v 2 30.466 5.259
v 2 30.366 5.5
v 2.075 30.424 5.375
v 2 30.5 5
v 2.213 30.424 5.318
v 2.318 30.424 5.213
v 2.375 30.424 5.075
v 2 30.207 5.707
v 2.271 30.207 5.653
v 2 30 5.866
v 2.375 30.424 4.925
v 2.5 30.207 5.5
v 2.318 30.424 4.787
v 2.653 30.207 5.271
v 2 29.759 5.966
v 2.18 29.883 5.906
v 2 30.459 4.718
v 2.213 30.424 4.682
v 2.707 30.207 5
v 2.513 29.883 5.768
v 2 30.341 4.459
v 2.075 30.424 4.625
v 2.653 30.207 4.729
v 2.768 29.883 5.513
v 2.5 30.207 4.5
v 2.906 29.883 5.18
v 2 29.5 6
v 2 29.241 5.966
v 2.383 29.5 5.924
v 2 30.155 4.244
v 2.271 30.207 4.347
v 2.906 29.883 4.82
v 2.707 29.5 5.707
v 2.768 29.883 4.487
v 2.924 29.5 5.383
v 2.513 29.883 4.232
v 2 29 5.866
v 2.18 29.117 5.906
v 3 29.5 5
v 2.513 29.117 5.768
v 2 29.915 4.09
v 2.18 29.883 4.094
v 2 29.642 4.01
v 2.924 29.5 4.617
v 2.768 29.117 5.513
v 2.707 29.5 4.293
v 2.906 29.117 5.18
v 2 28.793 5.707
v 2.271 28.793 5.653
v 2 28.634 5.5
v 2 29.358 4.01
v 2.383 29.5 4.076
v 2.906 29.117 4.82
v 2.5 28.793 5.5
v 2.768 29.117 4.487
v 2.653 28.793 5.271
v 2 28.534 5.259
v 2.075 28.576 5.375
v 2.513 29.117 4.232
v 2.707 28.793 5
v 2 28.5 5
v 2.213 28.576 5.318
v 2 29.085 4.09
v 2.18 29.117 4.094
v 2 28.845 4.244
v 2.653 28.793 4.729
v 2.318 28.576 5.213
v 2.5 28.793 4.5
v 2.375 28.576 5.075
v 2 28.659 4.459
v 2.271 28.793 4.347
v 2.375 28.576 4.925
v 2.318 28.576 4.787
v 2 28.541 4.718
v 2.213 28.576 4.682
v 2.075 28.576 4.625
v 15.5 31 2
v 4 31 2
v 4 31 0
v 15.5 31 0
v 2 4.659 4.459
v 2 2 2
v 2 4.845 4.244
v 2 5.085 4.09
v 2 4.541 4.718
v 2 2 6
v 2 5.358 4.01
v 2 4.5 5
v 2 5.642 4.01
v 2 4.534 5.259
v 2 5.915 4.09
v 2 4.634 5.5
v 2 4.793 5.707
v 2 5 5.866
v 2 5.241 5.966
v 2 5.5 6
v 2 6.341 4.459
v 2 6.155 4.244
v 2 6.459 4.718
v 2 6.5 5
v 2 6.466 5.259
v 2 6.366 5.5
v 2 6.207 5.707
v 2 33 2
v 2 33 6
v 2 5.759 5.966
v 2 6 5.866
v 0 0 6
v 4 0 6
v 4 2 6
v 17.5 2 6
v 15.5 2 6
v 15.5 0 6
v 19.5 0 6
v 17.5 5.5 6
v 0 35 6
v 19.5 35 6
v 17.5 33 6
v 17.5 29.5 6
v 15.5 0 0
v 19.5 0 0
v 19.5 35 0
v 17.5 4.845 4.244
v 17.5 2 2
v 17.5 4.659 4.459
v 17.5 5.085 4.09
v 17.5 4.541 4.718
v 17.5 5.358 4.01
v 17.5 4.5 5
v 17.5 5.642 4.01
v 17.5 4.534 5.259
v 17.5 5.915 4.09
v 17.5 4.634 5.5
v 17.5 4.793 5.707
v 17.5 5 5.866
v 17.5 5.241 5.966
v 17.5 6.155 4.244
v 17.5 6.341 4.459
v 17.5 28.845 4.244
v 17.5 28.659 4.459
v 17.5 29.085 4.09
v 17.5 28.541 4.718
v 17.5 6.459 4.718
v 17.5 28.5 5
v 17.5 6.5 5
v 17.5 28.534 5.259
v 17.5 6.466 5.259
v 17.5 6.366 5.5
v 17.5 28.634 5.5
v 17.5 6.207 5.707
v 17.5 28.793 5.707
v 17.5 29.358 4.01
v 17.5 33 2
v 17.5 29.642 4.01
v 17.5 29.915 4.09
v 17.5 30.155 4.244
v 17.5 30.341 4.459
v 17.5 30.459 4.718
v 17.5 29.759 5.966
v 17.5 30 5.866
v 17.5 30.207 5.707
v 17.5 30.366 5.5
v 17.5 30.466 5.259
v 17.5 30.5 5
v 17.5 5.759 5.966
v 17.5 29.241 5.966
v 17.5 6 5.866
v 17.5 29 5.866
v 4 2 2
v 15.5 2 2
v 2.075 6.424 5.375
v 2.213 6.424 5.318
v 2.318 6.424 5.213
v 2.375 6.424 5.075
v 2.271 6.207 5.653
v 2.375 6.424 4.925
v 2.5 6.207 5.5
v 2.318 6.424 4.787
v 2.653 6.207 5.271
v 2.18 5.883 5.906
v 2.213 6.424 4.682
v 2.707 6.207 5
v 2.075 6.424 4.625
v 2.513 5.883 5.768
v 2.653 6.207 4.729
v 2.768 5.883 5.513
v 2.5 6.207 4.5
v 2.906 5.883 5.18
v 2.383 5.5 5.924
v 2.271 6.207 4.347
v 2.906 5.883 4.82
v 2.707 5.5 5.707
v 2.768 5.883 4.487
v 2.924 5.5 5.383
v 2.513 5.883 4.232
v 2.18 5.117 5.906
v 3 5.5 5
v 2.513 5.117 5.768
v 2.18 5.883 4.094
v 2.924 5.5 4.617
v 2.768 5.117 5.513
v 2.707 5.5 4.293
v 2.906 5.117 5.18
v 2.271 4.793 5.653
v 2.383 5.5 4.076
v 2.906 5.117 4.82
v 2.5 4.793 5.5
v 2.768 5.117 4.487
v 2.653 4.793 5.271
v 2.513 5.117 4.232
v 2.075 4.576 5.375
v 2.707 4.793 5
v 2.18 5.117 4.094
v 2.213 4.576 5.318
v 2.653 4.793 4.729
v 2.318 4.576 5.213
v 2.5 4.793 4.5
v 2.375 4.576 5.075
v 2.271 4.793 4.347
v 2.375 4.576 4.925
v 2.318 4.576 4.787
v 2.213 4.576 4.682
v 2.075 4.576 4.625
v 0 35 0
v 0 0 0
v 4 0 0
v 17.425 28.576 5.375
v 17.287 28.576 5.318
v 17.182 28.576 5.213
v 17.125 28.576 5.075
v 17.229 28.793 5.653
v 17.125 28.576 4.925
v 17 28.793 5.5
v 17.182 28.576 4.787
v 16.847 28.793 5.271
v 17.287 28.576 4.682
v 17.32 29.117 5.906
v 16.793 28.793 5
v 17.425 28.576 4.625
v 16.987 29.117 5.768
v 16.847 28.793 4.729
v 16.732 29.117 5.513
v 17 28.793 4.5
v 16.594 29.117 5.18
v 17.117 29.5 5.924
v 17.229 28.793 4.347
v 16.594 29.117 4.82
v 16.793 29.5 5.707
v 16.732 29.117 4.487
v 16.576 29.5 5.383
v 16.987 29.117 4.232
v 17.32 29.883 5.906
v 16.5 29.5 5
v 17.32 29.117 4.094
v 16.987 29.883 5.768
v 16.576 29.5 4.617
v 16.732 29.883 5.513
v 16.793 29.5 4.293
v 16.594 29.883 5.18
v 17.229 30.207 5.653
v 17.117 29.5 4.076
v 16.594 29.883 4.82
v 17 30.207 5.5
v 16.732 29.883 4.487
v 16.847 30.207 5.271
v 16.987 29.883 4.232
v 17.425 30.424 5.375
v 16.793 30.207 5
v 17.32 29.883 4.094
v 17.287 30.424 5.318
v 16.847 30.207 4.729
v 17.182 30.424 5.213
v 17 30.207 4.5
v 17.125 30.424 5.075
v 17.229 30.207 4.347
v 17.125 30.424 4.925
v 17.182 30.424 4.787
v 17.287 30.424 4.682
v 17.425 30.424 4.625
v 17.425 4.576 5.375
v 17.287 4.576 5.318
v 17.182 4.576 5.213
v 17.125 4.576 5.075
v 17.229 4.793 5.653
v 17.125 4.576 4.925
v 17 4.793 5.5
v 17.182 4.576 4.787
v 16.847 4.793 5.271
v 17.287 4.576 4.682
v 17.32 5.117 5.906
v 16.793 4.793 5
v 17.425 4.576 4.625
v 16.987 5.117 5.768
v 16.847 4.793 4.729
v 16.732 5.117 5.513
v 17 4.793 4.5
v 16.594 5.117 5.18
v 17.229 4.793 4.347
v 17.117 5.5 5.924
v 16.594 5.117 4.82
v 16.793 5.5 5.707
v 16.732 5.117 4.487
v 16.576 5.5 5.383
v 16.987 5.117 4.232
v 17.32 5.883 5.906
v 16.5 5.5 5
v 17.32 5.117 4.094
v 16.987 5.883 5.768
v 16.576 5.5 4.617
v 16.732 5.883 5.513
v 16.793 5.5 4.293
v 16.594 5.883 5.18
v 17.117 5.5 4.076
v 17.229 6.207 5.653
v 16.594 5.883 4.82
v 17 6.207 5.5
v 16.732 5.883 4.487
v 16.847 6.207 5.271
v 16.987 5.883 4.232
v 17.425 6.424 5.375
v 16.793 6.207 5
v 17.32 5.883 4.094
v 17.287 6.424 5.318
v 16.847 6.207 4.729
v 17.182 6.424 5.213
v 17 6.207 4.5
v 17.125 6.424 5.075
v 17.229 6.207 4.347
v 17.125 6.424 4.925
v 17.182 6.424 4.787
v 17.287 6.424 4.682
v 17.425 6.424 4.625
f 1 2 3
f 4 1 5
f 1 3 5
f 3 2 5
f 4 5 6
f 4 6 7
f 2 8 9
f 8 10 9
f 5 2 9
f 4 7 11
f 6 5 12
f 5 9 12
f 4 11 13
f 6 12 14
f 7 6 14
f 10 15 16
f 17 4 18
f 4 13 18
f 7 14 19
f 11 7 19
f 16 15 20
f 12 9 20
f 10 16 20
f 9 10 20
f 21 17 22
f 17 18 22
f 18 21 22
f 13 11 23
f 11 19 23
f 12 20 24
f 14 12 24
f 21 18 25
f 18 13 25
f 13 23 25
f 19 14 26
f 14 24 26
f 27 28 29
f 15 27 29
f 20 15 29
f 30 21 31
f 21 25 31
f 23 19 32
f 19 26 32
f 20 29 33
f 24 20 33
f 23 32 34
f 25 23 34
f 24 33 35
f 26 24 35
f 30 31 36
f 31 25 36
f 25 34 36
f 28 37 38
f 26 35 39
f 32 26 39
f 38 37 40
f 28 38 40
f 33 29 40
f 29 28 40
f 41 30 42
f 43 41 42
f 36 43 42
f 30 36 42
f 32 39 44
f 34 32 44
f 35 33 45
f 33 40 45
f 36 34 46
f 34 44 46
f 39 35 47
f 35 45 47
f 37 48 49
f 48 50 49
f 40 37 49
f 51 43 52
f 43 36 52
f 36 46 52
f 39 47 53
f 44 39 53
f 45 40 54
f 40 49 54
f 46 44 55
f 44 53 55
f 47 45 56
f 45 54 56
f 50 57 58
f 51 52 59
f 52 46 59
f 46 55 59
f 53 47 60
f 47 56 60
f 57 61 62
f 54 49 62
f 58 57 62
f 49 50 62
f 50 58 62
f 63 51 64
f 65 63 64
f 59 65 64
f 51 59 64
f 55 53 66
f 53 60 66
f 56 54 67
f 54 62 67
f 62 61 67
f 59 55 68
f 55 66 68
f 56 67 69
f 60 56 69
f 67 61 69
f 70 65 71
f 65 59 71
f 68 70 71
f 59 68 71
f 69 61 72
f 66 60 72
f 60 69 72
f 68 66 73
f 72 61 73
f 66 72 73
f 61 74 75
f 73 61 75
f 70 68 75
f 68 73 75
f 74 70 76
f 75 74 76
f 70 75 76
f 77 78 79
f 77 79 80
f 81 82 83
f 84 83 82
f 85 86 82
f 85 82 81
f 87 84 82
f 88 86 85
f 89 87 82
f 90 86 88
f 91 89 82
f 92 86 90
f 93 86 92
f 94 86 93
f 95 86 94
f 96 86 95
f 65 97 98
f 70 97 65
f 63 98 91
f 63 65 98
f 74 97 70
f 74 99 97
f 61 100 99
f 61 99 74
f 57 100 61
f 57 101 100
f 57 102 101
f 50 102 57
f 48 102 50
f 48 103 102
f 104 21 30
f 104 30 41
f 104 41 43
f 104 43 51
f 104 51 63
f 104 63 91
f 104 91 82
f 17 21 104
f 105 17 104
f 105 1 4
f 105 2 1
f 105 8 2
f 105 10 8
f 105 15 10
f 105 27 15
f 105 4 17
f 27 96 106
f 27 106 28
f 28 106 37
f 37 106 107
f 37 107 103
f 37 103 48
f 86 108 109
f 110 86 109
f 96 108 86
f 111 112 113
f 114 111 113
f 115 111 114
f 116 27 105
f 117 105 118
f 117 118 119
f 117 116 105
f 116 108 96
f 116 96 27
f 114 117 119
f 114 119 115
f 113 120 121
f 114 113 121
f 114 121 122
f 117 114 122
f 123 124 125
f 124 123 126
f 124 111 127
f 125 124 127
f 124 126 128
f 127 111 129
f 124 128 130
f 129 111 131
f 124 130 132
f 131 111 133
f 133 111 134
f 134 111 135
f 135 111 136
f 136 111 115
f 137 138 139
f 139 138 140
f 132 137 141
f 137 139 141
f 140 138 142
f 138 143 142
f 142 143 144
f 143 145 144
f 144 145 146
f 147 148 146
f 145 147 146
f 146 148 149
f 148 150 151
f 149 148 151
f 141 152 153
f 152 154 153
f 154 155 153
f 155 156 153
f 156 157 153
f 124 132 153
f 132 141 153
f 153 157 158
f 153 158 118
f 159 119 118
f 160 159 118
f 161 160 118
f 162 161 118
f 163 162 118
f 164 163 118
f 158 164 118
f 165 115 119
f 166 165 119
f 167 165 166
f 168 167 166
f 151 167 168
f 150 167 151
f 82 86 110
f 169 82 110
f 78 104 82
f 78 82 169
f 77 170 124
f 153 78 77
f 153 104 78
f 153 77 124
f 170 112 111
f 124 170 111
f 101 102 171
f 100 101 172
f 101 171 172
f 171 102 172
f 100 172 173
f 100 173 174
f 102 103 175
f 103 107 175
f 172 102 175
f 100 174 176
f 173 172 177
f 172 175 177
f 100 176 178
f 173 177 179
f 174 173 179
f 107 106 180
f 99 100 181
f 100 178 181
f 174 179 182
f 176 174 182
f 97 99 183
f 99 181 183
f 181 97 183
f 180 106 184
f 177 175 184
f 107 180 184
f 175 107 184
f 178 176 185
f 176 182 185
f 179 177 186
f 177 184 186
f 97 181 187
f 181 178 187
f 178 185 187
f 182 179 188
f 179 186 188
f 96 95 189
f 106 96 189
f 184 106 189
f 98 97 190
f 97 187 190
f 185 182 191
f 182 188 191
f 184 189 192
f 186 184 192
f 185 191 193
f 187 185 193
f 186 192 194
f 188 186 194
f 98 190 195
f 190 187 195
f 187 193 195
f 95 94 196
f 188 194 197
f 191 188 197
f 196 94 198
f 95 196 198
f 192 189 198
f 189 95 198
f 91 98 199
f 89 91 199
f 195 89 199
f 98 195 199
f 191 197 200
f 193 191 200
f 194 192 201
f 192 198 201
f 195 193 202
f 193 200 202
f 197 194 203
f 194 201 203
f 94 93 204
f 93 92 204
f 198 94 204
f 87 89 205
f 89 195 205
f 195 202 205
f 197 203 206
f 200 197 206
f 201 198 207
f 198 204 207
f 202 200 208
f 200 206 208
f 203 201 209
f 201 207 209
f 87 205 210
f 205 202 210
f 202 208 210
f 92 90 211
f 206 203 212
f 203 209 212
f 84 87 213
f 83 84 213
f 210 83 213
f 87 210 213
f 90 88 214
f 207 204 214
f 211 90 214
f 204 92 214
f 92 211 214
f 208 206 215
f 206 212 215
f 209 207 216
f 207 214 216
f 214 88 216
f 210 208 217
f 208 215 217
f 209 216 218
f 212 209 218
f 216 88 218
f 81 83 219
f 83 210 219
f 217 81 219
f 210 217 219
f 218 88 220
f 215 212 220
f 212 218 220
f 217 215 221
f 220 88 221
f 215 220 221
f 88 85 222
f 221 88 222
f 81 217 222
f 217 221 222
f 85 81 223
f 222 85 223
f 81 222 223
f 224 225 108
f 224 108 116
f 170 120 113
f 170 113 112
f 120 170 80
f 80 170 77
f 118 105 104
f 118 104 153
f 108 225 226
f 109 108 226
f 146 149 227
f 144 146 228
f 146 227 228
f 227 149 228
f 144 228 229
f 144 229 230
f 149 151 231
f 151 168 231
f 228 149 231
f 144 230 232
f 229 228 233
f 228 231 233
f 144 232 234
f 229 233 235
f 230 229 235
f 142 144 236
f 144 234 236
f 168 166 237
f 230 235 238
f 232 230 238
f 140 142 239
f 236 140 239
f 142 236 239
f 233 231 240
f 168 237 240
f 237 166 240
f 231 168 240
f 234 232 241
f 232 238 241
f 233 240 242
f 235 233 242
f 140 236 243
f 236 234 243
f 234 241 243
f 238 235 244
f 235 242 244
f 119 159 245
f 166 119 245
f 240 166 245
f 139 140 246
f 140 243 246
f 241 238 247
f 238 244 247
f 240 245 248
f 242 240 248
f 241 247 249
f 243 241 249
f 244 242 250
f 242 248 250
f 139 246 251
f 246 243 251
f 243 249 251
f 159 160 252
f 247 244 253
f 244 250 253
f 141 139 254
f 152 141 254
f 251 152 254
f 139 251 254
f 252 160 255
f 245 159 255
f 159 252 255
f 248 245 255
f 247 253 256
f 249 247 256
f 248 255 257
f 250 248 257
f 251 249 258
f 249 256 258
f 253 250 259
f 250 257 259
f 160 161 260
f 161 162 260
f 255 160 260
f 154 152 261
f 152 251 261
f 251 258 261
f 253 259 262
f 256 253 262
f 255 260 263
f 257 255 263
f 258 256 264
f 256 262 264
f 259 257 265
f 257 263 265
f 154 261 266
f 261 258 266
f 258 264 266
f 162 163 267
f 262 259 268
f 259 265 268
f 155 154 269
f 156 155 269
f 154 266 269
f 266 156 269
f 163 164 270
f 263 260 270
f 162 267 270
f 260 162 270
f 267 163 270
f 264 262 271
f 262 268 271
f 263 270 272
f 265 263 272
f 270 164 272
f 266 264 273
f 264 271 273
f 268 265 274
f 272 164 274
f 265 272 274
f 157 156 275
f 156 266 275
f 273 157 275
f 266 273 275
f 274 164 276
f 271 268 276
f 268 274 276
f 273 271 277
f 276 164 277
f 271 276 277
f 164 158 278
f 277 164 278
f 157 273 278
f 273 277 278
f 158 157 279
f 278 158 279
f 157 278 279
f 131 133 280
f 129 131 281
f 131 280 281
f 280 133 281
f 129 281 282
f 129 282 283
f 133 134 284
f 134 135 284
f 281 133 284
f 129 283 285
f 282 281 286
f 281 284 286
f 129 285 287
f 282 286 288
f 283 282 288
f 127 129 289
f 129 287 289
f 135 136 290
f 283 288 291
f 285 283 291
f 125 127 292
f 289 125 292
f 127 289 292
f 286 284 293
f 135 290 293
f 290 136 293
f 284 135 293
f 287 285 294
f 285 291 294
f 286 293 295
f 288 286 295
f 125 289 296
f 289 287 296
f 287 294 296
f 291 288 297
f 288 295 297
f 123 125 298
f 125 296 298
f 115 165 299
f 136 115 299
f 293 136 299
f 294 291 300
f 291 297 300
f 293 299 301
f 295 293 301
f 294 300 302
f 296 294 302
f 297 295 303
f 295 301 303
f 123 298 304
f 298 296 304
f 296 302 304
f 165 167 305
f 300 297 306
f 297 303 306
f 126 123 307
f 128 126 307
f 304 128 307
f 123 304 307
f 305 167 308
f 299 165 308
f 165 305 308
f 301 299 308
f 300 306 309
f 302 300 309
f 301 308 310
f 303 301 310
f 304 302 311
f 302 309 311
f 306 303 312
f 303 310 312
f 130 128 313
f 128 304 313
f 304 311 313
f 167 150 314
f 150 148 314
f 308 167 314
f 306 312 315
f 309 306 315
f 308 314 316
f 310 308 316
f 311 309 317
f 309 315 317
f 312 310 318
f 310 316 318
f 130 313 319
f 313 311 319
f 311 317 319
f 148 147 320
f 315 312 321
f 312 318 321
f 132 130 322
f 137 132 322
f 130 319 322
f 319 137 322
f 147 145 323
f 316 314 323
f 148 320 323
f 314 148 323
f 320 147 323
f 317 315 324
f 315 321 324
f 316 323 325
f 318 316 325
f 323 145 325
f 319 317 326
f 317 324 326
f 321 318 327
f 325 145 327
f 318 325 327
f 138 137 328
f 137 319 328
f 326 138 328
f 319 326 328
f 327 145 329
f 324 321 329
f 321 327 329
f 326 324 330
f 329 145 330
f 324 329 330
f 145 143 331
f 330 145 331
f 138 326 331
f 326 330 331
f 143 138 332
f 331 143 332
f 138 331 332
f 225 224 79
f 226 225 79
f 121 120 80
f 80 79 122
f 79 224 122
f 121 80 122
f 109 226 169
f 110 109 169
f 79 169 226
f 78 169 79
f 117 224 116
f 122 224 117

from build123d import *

# Parameters (mm, degrees)
SKETCH070_W         = 19.5
SKETCH070_H         = 35
PAD035_DEPTH        = 6
SKETCH074_W         = 15.5
SKETCH074_H         = 31
POCKET025_DEPTH     = 4
SKETCH071_W         = 11.5
SKETCH071_H         = 27
POCKET023_DEPTH     = 2.001
SKETCH069_W         = 11.5
SKETCH069_H         = 4
POCKET024_DEPTH     = 6.001
REVOLUTION007_ANGLE = 180
REVOLUTION008_ANGLE = -180


with BuildPart() as part:
    # Sketch070 → Pad035 (new body)
    with BuildSketch(Plane.XY):
        with Locations((9.75, 17.5)):
            Rectangle(SKETCH070_W, SKETCH070_H)
    extrude(amount=PAD035_DEPTH)

    # Sketch074 (on Face6 of Pad035) → Pocket025 (cut)
    with BuildSketch(Plane.XY.offset(6)):
        with Locations((9.75, 17.5)):
            Rectangle(SKETCH074_W, SKETCH074_H)
    extrude(amount=-POCKET025_DEPTH, mode=Mode.SUBTRACT)

    # Sketch071 (on Face11 of Pocket025) → Pocket023 (cut, through all)
    with BuildSketch(Plane.XY.offset(2)):
        with Locations((9.75, 17.5)):
            Rectangle(SKETCH071_W, SKETCH071_H)
    extrude(amount=-POCKET023_DEPTH, mode=Mode.SUBTRACT)

    # Sketch069 (on Face5 of Pocket023) → Pocket024 (cut, through all)
    with BuildSketch(Plane.XY.offset(6)):
        with Locations((9.75, 2)):
            Rectangle(SKETCH069_W, SKETCH069_H)
    extrude(amount=-POCKET024_DEPTH, mode=Mode.SUBTRACT)

    # Sketch075 (on Face18 of Pocket024) → Revolution007 (revolve)
    with BuildSketch(Plane.YZ.offset(2)):
        with BuildLine():
            ThreePointArc((6.5, 5), (5.5, 6), (4.5, 5))
            Line((4.5, 5), (6.5, 5))
        make_face()
        with BuildLine():
            ThreePointArc((30.5, 5), (29.5, 6), (28.5, 5))
            Line((28.5, 5), (30.5, 5))
        make_face()
    revolve(axis=Axis((2, 6.5, 5), (0, 1, 0)), revolution_arc=REVOLUTION007_ANGLE)

    # Sketch076 (on Face17 of Revolution007) → Revolution008 (revolve)
    with BuildSketch(Plane(origin=(17.5, 0, 0), x_dir=(0, -1, 0), z_dir=(-1, 0, 0))):
        with BuildLine():
            ThreePointArc((-28.5, 5), (-29.5, 6), (-30.5, 5))
            Line((-30.5, 5), (-28.5, 5))
        make_face()
        with BuildLine():
            ThreePointArc((-4.5, 5), (-5.5, 6), (-6.5, 5))
            Line((-6.5, 5), (-4.5, 5))
        make_face()
    revolve(axis=Axis((17.5, 6.5, 5), (0, 1, 0)), revolution_arc=REVOLUTION008_ANGLE)


solid = part.part
